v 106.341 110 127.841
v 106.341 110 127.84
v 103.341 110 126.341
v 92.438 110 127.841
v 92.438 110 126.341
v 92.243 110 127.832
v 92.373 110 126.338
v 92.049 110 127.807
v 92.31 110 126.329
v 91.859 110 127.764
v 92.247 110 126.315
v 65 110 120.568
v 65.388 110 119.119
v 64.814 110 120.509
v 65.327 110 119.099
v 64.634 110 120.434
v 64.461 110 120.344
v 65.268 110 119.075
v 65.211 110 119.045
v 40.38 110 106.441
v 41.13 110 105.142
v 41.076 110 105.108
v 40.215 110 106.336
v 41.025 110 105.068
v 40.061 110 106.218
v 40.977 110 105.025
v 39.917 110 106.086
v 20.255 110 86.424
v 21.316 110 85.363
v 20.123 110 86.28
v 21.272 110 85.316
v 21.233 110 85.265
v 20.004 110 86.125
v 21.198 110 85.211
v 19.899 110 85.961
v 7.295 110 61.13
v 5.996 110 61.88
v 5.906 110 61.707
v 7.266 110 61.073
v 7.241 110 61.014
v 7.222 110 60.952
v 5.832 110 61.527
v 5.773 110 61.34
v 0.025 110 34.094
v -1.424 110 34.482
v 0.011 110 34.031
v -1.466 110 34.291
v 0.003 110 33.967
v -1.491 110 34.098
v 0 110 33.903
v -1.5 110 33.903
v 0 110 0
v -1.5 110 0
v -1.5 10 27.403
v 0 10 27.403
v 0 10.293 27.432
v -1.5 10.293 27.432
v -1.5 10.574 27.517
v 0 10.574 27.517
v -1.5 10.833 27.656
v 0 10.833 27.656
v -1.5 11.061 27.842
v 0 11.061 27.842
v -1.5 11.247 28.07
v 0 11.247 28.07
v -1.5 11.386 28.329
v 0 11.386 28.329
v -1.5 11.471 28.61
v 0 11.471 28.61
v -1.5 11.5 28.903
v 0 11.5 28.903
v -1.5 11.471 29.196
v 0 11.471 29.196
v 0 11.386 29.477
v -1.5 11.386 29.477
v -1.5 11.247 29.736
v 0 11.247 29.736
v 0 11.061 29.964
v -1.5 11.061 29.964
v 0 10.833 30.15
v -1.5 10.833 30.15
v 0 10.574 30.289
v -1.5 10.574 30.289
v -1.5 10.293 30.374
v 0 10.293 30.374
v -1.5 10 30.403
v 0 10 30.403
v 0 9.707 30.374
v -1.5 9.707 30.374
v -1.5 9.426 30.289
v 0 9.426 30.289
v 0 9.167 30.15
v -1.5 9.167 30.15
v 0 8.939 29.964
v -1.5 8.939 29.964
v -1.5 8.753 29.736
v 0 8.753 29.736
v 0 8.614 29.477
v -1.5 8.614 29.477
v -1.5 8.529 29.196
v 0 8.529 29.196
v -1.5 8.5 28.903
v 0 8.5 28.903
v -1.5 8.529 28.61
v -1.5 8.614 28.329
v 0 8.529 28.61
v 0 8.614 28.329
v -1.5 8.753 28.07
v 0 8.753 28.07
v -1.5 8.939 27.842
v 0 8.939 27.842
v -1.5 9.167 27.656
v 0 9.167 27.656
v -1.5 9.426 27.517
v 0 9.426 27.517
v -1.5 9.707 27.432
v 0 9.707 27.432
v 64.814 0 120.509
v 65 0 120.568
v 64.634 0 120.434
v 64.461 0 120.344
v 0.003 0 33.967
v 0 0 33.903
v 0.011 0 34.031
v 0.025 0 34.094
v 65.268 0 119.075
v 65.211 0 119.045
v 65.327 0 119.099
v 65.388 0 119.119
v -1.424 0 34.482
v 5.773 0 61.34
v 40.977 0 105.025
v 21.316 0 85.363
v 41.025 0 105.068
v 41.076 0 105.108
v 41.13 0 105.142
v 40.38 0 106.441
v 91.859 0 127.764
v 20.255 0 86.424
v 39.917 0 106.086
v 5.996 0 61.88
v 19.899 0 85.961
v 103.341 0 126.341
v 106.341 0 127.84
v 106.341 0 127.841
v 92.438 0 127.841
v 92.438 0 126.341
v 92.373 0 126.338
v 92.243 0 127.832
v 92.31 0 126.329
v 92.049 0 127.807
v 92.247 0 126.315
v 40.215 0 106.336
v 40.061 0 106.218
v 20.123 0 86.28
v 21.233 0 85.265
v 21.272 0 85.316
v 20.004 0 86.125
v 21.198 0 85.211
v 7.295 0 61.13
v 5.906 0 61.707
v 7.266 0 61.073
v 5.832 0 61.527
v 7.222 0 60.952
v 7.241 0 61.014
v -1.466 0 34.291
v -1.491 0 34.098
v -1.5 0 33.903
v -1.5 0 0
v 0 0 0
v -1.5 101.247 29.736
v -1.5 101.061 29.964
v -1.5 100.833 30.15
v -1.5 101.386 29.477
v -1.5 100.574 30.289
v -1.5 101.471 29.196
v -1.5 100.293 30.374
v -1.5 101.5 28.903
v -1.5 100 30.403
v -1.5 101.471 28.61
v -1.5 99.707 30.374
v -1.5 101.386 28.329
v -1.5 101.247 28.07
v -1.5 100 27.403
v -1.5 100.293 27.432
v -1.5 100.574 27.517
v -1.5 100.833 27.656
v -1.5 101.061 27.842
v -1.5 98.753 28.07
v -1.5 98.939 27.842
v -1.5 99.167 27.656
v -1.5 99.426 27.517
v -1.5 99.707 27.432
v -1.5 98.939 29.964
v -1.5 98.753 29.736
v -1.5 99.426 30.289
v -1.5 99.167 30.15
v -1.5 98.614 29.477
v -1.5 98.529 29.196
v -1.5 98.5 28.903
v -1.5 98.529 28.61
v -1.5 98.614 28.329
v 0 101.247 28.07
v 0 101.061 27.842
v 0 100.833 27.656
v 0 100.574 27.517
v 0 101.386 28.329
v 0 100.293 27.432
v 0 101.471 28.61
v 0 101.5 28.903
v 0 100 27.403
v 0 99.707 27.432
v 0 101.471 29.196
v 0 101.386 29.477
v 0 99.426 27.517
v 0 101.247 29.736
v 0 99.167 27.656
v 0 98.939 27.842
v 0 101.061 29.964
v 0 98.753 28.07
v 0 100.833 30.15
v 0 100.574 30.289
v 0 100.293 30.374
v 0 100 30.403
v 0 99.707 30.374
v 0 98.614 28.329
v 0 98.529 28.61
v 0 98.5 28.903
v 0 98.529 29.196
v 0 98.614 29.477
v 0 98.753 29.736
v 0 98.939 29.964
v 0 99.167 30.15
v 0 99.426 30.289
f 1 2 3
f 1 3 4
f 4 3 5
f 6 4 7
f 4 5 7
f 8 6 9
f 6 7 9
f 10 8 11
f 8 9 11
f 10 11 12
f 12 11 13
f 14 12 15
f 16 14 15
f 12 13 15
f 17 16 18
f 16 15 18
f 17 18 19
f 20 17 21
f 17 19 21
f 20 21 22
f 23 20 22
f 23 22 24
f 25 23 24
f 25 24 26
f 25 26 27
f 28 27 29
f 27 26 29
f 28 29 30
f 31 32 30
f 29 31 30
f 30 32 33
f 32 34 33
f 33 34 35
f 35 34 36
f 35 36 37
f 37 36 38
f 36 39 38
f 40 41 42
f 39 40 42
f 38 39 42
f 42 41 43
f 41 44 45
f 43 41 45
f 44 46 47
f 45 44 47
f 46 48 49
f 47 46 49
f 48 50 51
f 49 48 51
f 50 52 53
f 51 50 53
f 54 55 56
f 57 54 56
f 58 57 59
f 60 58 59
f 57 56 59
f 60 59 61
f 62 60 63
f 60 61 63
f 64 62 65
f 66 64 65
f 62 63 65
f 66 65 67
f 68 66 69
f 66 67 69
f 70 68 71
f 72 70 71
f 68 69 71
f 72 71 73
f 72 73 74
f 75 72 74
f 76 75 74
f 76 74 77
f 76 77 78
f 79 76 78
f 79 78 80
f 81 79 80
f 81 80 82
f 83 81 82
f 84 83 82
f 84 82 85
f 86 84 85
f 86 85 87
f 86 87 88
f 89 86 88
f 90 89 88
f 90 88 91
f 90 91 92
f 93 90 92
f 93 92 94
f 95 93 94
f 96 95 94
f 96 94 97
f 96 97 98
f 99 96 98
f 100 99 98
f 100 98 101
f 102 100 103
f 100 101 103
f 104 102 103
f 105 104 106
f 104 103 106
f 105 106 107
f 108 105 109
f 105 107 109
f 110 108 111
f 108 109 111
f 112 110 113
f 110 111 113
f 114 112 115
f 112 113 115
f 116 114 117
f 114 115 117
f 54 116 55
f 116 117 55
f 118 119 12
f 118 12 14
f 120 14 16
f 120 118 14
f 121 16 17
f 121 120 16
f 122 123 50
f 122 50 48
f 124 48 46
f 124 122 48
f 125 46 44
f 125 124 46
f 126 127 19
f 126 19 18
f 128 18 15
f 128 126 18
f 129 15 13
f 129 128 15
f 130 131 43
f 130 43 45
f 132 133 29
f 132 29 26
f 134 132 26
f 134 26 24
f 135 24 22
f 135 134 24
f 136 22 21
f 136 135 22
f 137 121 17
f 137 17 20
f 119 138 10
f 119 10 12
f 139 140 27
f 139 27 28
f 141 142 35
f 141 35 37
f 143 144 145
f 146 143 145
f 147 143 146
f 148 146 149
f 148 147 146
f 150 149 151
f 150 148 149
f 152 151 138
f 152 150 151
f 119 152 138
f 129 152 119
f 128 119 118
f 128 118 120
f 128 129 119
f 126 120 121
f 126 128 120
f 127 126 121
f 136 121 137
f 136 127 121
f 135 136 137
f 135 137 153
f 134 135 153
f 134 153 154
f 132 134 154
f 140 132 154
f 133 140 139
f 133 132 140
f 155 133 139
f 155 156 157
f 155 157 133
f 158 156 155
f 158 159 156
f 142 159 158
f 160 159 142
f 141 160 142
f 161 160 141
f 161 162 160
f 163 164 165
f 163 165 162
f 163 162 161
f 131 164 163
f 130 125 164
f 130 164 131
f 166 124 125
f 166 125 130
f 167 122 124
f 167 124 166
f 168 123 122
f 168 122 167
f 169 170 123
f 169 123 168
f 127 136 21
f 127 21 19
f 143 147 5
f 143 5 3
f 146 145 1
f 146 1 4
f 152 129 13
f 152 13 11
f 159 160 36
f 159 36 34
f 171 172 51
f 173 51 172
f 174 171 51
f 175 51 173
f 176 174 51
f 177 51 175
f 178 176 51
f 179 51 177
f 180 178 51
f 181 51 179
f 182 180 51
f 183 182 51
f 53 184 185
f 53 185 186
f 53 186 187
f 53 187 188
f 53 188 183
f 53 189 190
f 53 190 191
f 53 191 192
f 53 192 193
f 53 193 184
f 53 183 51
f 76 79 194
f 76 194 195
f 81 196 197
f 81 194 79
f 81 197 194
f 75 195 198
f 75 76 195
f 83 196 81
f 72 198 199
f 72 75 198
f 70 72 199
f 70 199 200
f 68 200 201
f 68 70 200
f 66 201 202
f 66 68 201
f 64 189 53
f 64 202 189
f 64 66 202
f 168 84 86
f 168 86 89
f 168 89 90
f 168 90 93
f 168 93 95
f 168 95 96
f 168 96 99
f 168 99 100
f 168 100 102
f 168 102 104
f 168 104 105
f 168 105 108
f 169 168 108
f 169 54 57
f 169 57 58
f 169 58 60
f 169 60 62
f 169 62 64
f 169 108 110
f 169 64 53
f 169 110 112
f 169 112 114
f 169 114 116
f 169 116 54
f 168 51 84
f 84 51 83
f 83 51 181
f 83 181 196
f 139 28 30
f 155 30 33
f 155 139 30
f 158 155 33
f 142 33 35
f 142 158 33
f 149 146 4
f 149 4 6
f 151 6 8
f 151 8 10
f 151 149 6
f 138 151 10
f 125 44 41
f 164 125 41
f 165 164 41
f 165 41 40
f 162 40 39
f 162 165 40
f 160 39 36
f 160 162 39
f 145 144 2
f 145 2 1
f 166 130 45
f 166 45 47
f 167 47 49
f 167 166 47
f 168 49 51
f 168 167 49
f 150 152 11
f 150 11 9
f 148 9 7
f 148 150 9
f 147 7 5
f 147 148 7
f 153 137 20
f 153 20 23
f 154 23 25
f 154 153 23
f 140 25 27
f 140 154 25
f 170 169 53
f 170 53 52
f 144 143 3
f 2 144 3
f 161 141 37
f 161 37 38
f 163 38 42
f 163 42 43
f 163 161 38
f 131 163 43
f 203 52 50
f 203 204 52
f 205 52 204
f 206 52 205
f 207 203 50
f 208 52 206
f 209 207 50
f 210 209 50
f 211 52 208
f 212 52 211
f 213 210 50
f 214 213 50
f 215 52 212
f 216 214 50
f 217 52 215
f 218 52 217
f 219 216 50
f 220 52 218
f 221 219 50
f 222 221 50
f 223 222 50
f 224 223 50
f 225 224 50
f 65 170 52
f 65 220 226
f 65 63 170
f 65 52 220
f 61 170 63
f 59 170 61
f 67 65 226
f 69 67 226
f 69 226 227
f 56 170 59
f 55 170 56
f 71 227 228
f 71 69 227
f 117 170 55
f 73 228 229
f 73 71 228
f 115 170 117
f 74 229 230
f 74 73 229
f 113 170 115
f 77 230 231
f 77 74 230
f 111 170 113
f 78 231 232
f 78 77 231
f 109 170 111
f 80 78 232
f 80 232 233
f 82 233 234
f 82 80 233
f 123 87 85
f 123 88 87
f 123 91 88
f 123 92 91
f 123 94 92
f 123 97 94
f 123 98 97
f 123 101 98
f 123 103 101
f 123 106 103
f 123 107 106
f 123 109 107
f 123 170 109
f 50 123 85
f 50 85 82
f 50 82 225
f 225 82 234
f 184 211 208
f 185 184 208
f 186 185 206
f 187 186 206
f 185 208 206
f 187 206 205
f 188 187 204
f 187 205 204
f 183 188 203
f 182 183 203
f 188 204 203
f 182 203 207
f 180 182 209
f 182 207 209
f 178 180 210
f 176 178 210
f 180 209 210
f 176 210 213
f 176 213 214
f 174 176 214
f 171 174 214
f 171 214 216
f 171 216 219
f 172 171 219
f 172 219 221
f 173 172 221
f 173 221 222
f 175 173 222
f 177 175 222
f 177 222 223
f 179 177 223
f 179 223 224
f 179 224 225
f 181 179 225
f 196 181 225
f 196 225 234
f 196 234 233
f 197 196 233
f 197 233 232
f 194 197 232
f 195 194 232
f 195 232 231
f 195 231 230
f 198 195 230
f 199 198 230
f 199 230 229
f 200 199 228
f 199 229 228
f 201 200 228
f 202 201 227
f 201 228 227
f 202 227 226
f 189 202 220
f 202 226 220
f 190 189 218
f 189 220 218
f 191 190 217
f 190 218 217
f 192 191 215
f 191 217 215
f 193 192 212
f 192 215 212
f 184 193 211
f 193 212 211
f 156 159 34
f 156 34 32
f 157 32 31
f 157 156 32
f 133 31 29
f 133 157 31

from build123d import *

# Parameters (mm, degrees)
BASE_FLANGE1_DEPTH          = 110
CHAMFER1_SIZE2              = 3
CHAMFER1_SIZE               = 1.5
F_3_0MM_PRESS_DOWEL_HOLE1_D = 3


# Sheet-metal steps are written as plain solids
with BuildPart() as part:
    # Sketch1 → Base-Flange1 (new body)
    with BuildSketch(Plane(origin=(0, 0, 0), x_dir=(1, 0, 0), z_dir=(0, 1, 0))):
        with BuildLine():
            Line((0, 0), (0, -20))
            Line((0, -20), (0, -33.90302477))
            ThreePointArc((0, -33.90302477), (0.006301715, -33.999170363), (0.025099036, -34.093670879))
            Line((0.025099036, -34.093670879), (7.221834227, -60.952252257))
            ThreePointArc((7.221834227, -60.952252257), (7.252805527, -61.043490765), (7.295420878, -61.129906149))
            Line((7.295420878, -61.129906149), (21.198445648, -85.21065143))
            ThreePointArc((21.198445648, -85.21065143), (21.25197589, -85.290765098), (21.315505105, -85.363206285))
            Line((21.315505105, -85.363206285), (40.977351294, -105.025052473))
            ThreePointArc((40.977351294, -105.025052473), (41.04979248, -105.088581688), (41.129906149, -105.14211193))
            Line((41.129906149, -105.14211193), (65.21065143, -119.0451367))
            ThreePointArc((65.21065143, -119.0451367), (65.297066813, -119.087752052), (65.388305321, -119.118723352))
            Line((65.388305321, -119.118723352), (92.246886699, -126.315458542))
            ThreePointArc((92.246886699, -126.315458542), (92.341387215, -126.334255863), (92.437532808, -126.340557578))
            Line((92.437532808, -126.340557578), (106.340557578, -126.340557578))
            Line((106.340557578, -126.340557578), (106.340557578, -127.840557578))
            Line((106.340557578, -127.840557578), (92.437532808, -127.840557578))
            ThreePointArc((92.437532808, -127.840557578), (92.145597926, -127.821423155), (91.858658132, -127.764347281))
            Line((91.858658132, -127.764347281), (65.000076753, -120.567612091))
            ThreePointArc((65.000076753, -120.567612091), (64.723041665, -120.47357135), (64.46065143, -120.344174806))
            Line((64.46065143, -120.344174806), (40.379906149, -106.441150036))
            ThreePointArc((40.379906148, -106.441150036), (40.136650336, -106.278611699), (39.916691122, -106.085712644))
            Line((39.916691122, -106.085712645), (20.254844934, -86.423866456))
            ThreePointArc((20.254844934, -86.423866456), (20.06194588, -86.203907242), (19.899407542, -85.96065143))
            Line((19.899407542, -85.96065143), (5.996382772, -61.879906149))
            ThreePointArc((5.996382772, -61.879906149), (5.866986228, -61.617515913), (5.772945487, -61.340480825))
            Line((5.772945487, -61.340480825), (-1.423789703, -34.481899447))
            ThreePointArc((-1.423789703, -34.481899447), (-1.480865577, -34.194959652), (-1.5, -33.90302477))
            Line((-1.5, -33.90302477), (-1.5, -20))
            Line((-1.5, -20), (-1.5, 0))
            Line((-1.5, 0), (0, 0))
        make_face()
    extrude(amount=BASE_FLANGE1_DEPTH)

    # Chamfer1
    chamfer1_edges = [part.edges().sort_by_distance(p)[0] for p in [
        (106.340557578, 55, 126.340557578),
    ]]
    chamfer1_side = [part.faces().sort_by_distance(p)[0] for p in [
        (106.340557578, 55, 126.370557578),
    ]]
    chamfer(chamfer1_edges, length=CHAMFER1_SIZE - 0.0001, length2=CHAMFER1_SIZE2 - 0.0001, reference=chamfer1_side[0])  # a hair under: the kernel refuses the full size

    # Ø3.0mm Press Dowel Hole1 (through all)
    with Locations(Plane(origin=(-3, -55.405236378, -125.638352017), x_dir=(0, 0, 1), z_dir=(-1, 0, 0))):
        with Locations((154.541376787, 155.405236378), (154.541376787, 65.405236378)):
            Hole(F_3_0MM_PRESS_DOWEL_HOLE1_D / 2)


solid = part.part
